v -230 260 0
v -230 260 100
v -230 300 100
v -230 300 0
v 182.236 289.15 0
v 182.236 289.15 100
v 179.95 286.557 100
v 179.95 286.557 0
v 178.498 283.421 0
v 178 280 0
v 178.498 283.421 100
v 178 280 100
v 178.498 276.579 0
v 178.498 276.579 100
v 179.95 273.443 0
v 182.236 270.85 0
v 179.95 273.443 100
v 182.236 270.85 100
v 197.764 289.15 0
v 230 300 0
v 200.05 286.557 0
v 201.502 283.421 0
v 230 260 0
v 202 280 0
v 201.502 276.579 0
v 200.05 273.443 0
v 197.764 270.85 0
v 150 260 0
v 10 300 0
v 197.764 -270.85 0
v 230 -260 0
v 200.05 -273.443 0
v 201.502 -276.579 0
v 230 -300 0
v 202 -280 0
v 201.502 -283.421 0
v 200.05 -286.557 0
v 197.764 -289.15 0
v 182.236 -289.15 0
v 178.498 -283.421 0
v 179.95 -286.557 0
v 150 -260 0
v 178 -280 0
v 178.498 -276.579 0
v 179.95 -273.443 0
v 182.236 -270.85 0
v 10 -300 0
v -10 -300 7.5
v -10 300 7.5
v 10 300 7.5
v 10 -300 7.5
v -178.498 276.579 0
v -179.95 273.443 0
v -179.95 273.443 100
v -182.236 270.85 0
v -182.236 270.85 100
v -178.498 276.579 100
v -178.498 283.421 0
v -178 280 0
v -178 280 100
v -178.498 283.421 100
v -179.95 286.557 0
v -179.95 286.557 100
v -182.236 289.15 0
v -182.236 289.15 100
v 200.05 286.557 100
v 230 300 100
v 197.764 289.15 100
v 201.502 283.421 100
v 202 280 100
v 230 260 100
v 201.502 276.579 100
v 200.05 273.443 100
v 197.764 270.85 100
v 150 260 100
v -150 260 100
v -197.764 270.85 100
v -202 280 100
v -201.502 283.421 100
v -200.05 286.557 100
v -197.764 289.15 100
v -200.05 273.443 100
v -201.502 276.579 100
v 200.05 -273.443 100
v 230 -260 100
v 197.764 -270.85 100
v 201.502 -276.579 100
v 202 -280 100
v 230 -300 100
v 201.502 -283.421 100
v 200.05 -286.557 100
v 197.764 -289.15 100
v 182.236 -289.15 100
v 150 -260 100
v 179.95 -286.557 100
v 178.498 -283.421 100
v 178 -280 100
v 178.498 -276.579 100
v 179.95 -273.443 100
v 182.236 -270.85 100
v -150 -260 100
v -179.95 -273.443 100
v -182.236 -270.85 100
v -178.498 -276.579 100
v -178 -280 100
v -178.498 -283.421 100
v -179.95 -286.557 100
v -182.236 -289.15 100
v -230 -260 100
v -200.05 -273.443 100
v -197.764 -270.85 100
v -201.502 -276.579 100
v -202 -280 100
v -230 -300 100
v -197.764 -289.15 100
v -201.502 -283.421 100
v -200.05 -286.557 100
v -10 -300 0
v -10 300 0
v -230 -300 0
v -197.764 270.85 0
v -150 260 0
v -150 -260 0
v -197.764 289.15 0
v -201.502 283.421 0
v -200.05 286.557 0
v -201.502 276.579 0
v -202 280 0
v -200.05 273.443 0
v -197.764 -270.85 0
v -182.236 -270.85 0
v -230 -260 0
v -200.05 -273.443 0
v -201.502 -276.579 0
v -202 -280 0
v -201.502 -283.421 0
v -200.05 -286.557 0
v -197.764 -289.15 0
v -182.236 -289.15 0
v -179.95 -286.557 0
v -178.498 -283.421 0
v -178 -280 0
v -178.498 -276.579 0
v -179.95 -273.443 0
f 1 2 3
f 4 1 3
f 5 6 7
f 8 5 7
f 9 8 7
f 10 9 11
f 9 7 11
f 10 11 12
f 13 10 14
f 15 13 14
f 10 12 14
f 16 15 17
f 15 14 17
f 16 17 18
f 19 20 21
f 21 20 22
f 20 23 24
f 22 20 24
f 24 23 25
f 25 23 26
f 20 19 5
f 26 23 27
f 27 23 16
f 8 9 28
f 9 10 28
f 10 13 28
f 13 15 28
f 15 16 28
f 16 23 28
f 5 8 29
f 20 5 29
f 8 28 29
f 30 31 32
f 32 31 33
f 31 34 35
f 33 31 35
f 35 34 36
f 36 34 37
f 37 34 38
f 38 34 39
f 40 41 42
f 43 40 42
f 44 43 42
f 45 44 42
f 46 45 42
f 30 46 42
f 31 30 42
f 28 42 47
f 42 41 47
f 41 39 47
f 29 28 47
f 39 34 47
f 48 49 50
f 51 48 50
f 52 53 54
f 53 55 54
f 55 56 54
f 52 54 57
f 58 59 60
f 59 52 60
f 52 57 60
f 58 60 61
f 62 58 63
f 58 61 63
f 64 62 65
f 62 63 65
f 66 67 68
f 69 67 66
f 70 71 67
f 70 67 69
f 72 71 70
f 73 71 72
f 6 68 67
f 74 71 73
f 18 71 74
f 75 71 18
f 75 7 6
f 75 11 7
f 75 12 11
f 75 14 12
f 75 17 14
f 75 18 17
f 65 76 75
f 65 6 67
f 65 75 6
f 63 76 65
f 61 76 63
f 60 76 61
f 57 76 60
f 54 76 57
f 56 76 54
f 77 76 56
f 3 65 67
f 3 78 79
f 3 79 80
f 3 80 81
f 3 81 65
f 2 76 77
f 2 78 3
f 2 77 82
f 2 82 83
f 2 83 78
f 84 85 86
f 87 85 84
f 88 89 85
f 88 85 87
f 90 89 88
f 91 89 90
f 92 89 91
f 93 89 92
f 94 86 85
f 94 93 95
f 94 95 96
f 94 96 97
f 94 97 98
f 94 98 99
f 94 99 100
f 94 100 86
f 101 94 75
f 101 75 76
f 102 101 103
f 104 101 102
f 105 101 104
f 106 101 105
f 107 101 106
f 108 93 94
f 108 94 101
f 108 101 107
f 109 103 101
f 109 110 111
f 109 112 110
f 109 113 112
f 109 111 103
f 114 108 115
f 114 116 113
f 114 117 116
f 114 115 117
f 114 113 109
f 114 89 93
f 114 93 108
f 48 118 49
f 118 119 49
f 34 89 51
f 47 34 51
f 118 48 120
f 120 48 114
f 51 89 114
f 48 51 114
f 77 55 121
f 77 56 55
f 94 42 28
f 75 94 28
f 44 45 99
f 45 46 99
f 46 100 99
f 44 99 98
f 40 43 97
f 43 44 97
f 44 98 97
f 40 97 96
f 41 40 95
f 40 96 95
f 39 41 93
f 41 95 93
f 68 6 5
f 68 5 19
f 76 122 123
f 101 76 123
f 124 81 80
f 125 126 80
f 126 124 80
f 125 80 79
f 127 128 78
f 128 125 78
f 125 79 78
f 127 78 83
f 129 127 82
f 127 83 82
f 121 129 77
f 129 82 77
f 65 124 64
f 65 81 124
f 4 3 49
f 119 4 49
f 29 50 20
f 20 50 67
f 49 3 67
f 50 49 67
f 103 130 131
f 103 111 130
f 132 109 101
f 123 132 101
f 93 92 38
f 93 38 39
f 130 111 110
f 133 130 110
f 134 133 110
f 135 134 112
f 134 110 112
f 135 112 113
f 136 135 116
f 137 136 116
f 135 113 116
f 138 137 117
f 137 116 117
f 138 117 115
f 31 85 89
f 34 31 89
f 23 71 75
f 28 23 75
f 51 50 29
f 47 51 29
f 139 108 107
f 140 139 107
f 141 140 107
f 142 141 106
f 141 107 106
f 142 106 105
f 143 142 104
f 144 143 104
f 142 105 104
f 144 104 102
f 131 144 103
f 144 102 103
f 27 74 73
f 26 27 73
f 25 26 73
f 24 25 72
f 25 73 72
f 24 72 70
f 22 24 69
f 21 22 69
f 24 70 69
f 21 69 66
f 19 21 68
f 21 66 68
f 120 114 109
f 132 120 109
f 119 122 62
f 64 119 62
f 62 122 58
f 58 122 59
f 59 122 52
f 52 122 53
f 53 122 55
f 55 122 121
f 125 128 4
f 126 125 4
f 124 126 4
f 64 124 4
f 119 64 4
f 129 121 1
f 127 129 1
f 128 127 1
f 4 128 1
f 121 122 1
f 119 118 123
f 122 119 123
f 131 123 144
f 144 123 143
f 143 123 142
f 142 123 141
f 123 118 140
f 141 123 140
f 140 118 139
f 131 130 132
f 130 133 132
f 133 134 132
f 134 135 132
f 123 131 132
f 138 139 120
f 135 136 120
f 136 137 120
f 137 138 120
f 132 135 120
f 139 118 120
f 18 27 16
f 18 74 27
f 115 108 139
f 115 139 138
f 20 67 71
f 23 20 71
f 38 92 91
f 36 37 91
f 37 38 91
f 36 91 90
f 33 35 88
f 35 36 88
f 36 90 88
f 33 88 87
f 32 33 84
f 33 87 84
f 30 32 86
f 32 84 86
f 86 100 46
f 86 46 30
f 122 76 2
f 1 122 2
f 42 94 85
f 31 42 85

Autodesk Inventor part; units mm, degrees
ref_plane "YZ Plane" through (0, 0, 0) normal (1, 0, 0) x (0, 1, 0)
ref_plane "XZ Plane" through (0, 0, 0) normal (0, 1, 0) x (-1, 0, 0)
sketch "Sketch1" plane through (0, 0, 0) normal (0, 0, 1) x (1, 0, 0)
  line L0 (150, 300) -> (-150, 300)
  line L1 (-150, 300) -> (-150, -300)
  line L2 (-150, -300) -> (150, -300)
  line L3 (150, -300) -> (150, 300)
  line L4 (150, 300) -> (-150, -300) construction
  line L5 (-150, 300) -> (150, -300) construction
  point P0 (0, 0)
  dimension "d0" = 300
  dimension "d1" = 600
extrude "Extrusion1" add sketch "Sketch1" along normal blind 100
sketch "Sketch2" plane through (0, 0, 100) normal (0, 0, 1) x (1, 0, 0)
  line L0 (-150, 300) -> (-150, -300) projected
  line L1 (-150, -300) -> (-230, -300)
  line L2 (-230, -300) -> (-230, -260)
  line L3 (-230, -260) -> (-150, -260)
  line L4 (-150, -260) -> (-150, -300)
  point P0 (0, 0)
  dimension "d4" = 80
  dimension "d5" = 40
extrude "Extrusion2" add sketch "Sketch2" against normal up to surface (100 mm away)
sketch "Sketch3" plane through (0, 0, 100) normal (0, 0, 1) x (1, 0, 0)
  line L0 (-150, 300) -> (-150, -260) projected
  line L1 (-150, -260) -> (-150, -300) construction
  line L2 (150, -300) -> (-230, -300) projected
  line L3 (-150, -260) -> (-230, -260) projected
  line L4 (-230, -260) -> (-150, -300) construction
  line L5 (-150, -260) -> (-230, -300) construction
  line L6 (-182.2361, -289.15) -> (-197.7639, -289.15)
  line L7 (-197.7639, -289.15) -> (-197.7639, -270.85) construction
  line L8 (-197.7639, -270.85) -> (-182.2361, -270.85)
  line L9 (-182.2361, -289.15) -> (-197.7639, -270.85) construction
  line L10 (-197.7639, -289.15) -> (-182.2361, -270.85) construction
  arc A0 (-197.7639, -270.85) -> (-197.7639, -289.15) centre (-190, -280) ccw
  arc A1 (-182.2361, -289.15) -> (-182.2361, -270.85) centre (-190, -280) ccw
  point P0 (0, 0)
  dimension "d9" = 18.3
extrude "Extrusion3" cut sketch "Sketch3" against normal up to surface (100 mm away)
ref_plane "Work Plane1" through (0, -300, 0) normal (1, 0, 0) x (0, 0, -1)
mirror "Mirror1" about plane through (0, -300, 0) normal (1, 0, 0) of "Extrusion2", "Extrusion3"
ref_plane "Work Plane2" through (-150, 0, 0) normal (0, 1, 0) x (1, 0, 0)
mirror "Mirror2" about plane through (-150, 0, 0) normal (0, 1, 0) of "Extrusion2", "Extrusion3", "Mirror1"
sketch "Sketch4" plane through (-230, 300, 0) normal (0, 1, 0) x (1, 0, 0)
  line L0 (240, 7.5) -> (220, 7.5)
  line L1 (220, 7.5) -> (220, -7.5)
  line L2 (220, -7.5) -> (240, -7.5)
  line L3 (240, -7.5) -> (240, 7.5)
  line L4 (240, 7.5) -> (220, -7.5) construction
  line L5 (220, 7.5) -> (240, -7.5) construction
  point P0 (230, 0)
  dimension "d12" = 20
  dimension "d13" = 15
extrude "Extrusion4" cut sketch "Sketch4" against normal through all
properties part number "backplate"
